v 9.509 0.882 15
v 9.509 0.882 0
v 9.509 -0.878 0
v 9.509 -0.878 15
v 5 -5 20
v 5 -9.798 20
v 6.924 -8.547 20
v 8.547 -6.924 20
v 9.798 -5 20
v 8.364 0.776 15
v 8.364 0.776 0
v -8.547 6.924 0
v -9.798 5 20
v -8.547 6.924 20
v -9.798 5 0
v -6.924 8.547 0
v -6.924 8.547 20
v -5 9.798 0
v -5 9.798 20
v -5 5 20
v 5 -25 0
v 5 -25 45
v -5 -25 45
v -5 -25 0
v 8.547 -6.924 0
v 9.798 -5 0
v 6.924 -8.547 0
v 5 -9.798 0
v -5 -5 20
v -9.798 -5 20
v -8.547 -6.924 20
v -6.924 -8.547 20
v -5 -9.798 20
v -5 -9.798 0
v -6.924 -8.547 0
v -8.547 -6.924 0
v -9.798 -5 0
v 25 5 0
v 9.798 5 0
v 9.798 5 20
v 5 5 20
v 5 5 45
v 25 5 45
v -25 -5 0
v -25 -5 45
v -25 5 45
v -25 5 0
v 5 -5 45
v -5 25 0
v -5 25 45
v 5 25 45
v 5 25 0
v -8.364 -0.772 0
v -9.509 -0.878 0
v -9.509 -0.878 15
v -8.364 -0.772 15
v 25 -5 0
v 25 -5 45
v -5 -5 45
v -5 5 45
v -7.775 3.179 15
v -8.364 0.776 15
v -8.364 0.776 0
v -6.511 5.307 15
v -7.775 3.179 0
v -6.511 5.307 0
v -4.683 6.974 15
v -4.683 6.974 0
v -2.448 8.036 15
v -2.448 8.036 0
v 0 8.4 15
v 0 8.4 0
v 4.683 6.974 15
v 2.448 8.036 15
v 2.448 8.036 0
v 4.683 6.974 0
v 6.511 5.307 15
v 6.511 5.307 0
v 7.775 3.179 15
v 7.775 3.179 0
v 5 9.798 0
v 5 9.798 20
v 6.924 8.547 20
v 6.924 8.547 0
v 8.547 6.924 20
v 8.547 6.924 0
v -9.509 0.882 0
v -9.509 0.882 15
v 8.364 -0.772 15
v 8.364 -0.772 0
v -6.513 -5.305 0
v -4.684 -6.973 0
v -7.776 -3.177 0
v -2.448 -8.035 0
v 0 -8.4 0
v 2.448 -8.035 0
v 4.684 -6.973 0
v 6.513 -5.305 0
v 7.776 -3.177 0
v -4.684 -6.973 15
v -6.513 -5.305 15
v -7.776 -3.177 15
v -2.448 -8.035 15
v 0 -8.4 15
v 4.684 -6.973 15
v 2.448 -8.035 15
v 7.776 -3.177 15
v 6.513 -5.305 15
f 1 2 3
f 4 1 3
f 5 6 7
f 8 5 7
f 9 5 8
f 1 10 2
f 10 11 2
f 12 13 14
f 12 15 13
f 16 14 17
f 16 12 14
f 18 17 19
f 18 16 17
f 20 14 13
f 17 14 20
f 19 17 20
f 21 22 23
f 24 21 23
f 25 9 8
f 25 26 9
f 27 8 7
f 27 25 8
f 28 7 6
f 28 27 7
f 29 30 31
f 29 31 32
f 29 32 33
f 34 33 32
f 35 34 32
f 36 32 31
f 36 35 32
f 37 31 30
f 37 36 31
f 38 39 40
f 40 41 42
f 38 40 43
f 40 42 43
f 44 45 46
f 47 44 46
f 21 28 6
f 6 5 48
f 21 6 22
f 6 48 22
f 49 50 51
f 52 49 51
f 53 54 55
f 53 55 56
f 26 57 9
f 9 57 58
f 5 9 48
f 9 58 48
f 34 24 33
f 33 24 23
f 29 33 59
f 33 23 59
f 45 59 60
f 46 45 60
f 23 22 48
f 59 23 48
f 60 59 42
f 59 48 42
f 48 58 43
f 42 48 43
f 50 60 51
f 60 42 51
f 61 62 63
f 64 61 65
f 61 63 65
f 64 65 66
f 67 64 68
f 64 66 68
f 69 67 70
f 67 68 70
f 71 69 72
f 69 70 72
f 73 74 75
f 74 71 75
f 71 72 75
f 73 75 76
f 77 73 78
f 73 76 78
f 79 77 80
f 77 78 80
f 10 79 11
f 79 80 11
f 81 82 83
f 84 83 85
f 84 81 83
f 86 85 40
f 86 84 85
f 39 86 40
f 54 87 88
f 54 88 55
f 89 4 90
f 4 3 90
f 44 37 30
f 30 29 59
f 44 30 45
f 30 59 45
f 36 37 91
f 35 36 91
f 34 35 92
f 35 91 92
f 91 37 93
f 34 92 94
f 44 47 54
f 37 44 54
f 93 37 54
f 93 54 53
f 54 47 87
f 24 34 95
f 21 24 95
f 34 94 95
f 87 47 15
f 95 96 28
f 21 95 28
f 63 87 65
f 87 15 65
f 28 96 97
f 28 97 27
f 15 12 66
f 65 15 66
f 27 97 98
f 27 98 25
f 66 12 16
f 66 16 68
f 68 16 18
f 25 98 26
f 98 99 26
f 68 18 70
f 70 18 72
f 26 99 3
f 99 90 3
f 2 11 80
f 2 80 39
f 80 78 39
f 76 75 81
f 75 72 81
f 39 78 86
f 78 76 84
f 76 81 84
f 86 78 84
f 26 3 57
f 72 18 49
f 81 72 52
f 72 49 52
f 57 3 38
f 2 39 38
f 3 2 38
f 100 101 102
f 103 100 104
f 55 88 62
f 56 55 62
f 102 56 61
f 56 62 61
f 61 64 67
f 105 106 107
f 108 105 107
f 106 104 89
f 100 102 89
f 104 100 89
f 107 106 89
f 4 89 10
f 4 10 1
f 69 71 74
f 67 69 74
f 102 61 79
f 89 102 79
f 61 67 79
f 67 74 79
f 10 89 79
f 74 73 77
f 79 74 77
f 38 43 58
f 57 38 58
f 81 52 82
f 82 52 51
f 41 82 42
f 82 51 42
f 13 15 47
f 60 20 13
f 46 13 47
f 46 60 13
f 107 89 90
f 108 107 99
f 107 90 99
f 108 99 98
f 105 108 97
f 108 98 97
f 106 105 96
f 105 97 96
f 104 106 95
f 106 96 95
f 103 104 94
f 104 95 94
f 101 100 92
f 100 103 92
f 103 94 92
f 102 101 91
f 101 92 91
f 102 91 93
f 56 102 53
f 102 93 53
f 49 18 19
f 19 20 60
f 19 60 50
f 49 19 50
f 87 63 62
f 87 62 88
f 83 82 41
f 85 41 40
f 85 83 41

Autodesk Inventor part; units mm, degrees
ref_plane "YZ Plane" through (0, 0, 0) normal (1, 0, 0) x (0, 1, 0)
ref_plane "XZ Plane" through (0, 0, 0) normal (0, 1, 0) x (-1, 0, 0)
ref_plane "XY Plane" through (0, 0, 0) normal (0, 0, 1) x (1, 0, 0)
sketch "Sketch1" plane through (0, 0, 0) normal (0, 0, 1) x (1, 0, 0)
  circle A0 centre (0, 0) radius 8.4
  circle A1 centre (0, 0) radius 11
  line L0 (9.5093, -0.878) -> (0, 0)
  line L1 (0, 0) -> (9.5093, 0.8821)
  line L2 (9.5093, 0.8821) -> (9.5093, -0.878)
  line L3 (0, 0) -> (-9.5093, 0.8821)
  line L4 (-9.5093, 0.8821) -> (-9.5093, -0.878)
  line L5 (-9.5093, -0.878) -> (0, 0)
  point P0 (8.3644, -0.7723)
  point P1 (-8.3644, -0.7723)
  point P2 (-8.3641, 0.7759)
  point P3 (8.3641, 0.7759)
  dimension "d0" = 16.8
  dimension "d1" = 22
extrude "Extrusion1" add sketch "Sketch1" along normal blind 15
sketch "Sketch2" plane through (0, 0, 15) normal (0, 0, 1) x (1, 0, 0)
  circle A0 centre (0, 0) radius 11
extrude "Extrusion2" add sketch "Sketch2" along normal blind 5
sketch "Sketch3" plane through (0, 0, 20) normal (0, 0, 1) x (1, 0, 0)
  line L0 (-5, 5) -> (5, 5)
  line L1 (5, 5) -> (5, -5)
  line L2 (5, -5) -> (-5, -5)
  line L3 (-5, -5) -> (-5, 5)
  line L4 (-5, 5) -> (5, -5) construction
  line L5 (5, 5) -> (-5, -5) construction
  point P0 (0, 0)
  dimension "d6" = 10
  dimension "d7" = 10
extrude "Extrusion3" add sketch "Sketch3" along normal blind 25
sketch "Sketch4" plane through (-5, 5, 20) normal (0, 1, 0) x (1, 0, 0)
  point P0 (5, 20)
sketch "Sketch5" plane through (-5, 5, 20) normal (0, 1, 0) x (1, 0, 0)
  line L0 (10, 0) -> (0, 0) projected
  line L1 (0, -25) -> (10, -25) projected
  line L2 (0, 0) -> (10, 0)
  line L3 (10, 0) -> (10, -25)
  line L4 (10, -25) -> (0, -25)
  line L5 (0, -25) -> (0, 0)
  point P0 (5, 20)
sketch "Sketch6" plane through (5, -5, 20) normal (1, 0, 0) x (0, 0, -1)
  line L0 (0, 10) -> (0, 0) projected
  line L1 (0, 0) -> (-25, 0) projected
  line L2 (0, 10) -> (-25, 10)
  line L3 (-25, 10) -> (-25, 0)
  line L4 (-25, 0) -> (0, 0)
  line L5 (0, 0) -> (0, 10)
  point P0 (20, 5)
extrude "Extrusion4" add sketch "Sketch6" along normal blind 20
extrude "Extrusion5" add sketch "Sketch5" along normal blind 20
mirror "Mirror1" about plane through (0, 0, 0) normal (0, 1, 0) of "Extrusion4", "Extrusion5"
mirror "Mirror2" about plane through (0, 0, 0) normal (1, 0, 0) of "Extrusion4"
sketch "Sketch7" plane through (25, 5, 20) normal (0, 0, -1) x (-1, 0, 0)
  line L0 (0, 0) -> (0, -10) projected
  arc A0 (20, 4.798) -> (15.202, 0) centre (25, -5) ccw projected
  line L1 (0, -10) -> (15.202, -10)
  line L2 (15.202, -10) -> (15.202, 0)
  line L3 (15.202, 0) -> (0, 0)
  line L4 (0, 0) -> (0, -10)
  arc A1 (15.202, 0) -> (15.202, -10) centre (25, -5) ccw projected
  circle A2 centre (25, -5) radius 11
  line L5 (20, -10) -> (20, -30) projected
  line L6 (30, -30) -> (30, -10) projected
  line L7 (20, -30) -> (30, -30)
  line L8 (30, -30) -> (30, -14.798)
  line L9 (30, -14.798) -> (20, -14.798)
  line L10 (20, -14.798) -> (20, -30)
  line L11 (30, 0) -> (30, 20) projected
  arc A3 (30, 4.798) -> (20, 4.798) centre (25, -5) ccw projected
  line L12 (30, 20) -> (20, 20)
  line L13 (20, 20) -> (20, 4.798)
  line L14 (20, 4.798) -> (30, 4.798)
  line L15 (30, 4.798) -> (30, 20)
  line L16 (30, 0) -> (50, 0) projected
  arc A4 (34.798, -10) -> (34.798, 0) centre (25, -5) ccw projected
  line L17 (50, 0) -> (34.798, 0)
  line L18 (34.798, 0) -> (34.798, -10)
  line L19 (34.798, -10) -> (50, -10)
  line L20 (50, -10) -> (50, 0)
  point P0 (30, 4.798)
extrude "Extrusion6" add sketch "Sketch7" along normal blind 20 contours L3 A1 L1 L0 | L13 L12 L11 A2 | A2 L6 L7 L5 | L16 L20 L19 A2
properties part number "2xxx_Rx_Coil_Winder_MPSv2_v1"
